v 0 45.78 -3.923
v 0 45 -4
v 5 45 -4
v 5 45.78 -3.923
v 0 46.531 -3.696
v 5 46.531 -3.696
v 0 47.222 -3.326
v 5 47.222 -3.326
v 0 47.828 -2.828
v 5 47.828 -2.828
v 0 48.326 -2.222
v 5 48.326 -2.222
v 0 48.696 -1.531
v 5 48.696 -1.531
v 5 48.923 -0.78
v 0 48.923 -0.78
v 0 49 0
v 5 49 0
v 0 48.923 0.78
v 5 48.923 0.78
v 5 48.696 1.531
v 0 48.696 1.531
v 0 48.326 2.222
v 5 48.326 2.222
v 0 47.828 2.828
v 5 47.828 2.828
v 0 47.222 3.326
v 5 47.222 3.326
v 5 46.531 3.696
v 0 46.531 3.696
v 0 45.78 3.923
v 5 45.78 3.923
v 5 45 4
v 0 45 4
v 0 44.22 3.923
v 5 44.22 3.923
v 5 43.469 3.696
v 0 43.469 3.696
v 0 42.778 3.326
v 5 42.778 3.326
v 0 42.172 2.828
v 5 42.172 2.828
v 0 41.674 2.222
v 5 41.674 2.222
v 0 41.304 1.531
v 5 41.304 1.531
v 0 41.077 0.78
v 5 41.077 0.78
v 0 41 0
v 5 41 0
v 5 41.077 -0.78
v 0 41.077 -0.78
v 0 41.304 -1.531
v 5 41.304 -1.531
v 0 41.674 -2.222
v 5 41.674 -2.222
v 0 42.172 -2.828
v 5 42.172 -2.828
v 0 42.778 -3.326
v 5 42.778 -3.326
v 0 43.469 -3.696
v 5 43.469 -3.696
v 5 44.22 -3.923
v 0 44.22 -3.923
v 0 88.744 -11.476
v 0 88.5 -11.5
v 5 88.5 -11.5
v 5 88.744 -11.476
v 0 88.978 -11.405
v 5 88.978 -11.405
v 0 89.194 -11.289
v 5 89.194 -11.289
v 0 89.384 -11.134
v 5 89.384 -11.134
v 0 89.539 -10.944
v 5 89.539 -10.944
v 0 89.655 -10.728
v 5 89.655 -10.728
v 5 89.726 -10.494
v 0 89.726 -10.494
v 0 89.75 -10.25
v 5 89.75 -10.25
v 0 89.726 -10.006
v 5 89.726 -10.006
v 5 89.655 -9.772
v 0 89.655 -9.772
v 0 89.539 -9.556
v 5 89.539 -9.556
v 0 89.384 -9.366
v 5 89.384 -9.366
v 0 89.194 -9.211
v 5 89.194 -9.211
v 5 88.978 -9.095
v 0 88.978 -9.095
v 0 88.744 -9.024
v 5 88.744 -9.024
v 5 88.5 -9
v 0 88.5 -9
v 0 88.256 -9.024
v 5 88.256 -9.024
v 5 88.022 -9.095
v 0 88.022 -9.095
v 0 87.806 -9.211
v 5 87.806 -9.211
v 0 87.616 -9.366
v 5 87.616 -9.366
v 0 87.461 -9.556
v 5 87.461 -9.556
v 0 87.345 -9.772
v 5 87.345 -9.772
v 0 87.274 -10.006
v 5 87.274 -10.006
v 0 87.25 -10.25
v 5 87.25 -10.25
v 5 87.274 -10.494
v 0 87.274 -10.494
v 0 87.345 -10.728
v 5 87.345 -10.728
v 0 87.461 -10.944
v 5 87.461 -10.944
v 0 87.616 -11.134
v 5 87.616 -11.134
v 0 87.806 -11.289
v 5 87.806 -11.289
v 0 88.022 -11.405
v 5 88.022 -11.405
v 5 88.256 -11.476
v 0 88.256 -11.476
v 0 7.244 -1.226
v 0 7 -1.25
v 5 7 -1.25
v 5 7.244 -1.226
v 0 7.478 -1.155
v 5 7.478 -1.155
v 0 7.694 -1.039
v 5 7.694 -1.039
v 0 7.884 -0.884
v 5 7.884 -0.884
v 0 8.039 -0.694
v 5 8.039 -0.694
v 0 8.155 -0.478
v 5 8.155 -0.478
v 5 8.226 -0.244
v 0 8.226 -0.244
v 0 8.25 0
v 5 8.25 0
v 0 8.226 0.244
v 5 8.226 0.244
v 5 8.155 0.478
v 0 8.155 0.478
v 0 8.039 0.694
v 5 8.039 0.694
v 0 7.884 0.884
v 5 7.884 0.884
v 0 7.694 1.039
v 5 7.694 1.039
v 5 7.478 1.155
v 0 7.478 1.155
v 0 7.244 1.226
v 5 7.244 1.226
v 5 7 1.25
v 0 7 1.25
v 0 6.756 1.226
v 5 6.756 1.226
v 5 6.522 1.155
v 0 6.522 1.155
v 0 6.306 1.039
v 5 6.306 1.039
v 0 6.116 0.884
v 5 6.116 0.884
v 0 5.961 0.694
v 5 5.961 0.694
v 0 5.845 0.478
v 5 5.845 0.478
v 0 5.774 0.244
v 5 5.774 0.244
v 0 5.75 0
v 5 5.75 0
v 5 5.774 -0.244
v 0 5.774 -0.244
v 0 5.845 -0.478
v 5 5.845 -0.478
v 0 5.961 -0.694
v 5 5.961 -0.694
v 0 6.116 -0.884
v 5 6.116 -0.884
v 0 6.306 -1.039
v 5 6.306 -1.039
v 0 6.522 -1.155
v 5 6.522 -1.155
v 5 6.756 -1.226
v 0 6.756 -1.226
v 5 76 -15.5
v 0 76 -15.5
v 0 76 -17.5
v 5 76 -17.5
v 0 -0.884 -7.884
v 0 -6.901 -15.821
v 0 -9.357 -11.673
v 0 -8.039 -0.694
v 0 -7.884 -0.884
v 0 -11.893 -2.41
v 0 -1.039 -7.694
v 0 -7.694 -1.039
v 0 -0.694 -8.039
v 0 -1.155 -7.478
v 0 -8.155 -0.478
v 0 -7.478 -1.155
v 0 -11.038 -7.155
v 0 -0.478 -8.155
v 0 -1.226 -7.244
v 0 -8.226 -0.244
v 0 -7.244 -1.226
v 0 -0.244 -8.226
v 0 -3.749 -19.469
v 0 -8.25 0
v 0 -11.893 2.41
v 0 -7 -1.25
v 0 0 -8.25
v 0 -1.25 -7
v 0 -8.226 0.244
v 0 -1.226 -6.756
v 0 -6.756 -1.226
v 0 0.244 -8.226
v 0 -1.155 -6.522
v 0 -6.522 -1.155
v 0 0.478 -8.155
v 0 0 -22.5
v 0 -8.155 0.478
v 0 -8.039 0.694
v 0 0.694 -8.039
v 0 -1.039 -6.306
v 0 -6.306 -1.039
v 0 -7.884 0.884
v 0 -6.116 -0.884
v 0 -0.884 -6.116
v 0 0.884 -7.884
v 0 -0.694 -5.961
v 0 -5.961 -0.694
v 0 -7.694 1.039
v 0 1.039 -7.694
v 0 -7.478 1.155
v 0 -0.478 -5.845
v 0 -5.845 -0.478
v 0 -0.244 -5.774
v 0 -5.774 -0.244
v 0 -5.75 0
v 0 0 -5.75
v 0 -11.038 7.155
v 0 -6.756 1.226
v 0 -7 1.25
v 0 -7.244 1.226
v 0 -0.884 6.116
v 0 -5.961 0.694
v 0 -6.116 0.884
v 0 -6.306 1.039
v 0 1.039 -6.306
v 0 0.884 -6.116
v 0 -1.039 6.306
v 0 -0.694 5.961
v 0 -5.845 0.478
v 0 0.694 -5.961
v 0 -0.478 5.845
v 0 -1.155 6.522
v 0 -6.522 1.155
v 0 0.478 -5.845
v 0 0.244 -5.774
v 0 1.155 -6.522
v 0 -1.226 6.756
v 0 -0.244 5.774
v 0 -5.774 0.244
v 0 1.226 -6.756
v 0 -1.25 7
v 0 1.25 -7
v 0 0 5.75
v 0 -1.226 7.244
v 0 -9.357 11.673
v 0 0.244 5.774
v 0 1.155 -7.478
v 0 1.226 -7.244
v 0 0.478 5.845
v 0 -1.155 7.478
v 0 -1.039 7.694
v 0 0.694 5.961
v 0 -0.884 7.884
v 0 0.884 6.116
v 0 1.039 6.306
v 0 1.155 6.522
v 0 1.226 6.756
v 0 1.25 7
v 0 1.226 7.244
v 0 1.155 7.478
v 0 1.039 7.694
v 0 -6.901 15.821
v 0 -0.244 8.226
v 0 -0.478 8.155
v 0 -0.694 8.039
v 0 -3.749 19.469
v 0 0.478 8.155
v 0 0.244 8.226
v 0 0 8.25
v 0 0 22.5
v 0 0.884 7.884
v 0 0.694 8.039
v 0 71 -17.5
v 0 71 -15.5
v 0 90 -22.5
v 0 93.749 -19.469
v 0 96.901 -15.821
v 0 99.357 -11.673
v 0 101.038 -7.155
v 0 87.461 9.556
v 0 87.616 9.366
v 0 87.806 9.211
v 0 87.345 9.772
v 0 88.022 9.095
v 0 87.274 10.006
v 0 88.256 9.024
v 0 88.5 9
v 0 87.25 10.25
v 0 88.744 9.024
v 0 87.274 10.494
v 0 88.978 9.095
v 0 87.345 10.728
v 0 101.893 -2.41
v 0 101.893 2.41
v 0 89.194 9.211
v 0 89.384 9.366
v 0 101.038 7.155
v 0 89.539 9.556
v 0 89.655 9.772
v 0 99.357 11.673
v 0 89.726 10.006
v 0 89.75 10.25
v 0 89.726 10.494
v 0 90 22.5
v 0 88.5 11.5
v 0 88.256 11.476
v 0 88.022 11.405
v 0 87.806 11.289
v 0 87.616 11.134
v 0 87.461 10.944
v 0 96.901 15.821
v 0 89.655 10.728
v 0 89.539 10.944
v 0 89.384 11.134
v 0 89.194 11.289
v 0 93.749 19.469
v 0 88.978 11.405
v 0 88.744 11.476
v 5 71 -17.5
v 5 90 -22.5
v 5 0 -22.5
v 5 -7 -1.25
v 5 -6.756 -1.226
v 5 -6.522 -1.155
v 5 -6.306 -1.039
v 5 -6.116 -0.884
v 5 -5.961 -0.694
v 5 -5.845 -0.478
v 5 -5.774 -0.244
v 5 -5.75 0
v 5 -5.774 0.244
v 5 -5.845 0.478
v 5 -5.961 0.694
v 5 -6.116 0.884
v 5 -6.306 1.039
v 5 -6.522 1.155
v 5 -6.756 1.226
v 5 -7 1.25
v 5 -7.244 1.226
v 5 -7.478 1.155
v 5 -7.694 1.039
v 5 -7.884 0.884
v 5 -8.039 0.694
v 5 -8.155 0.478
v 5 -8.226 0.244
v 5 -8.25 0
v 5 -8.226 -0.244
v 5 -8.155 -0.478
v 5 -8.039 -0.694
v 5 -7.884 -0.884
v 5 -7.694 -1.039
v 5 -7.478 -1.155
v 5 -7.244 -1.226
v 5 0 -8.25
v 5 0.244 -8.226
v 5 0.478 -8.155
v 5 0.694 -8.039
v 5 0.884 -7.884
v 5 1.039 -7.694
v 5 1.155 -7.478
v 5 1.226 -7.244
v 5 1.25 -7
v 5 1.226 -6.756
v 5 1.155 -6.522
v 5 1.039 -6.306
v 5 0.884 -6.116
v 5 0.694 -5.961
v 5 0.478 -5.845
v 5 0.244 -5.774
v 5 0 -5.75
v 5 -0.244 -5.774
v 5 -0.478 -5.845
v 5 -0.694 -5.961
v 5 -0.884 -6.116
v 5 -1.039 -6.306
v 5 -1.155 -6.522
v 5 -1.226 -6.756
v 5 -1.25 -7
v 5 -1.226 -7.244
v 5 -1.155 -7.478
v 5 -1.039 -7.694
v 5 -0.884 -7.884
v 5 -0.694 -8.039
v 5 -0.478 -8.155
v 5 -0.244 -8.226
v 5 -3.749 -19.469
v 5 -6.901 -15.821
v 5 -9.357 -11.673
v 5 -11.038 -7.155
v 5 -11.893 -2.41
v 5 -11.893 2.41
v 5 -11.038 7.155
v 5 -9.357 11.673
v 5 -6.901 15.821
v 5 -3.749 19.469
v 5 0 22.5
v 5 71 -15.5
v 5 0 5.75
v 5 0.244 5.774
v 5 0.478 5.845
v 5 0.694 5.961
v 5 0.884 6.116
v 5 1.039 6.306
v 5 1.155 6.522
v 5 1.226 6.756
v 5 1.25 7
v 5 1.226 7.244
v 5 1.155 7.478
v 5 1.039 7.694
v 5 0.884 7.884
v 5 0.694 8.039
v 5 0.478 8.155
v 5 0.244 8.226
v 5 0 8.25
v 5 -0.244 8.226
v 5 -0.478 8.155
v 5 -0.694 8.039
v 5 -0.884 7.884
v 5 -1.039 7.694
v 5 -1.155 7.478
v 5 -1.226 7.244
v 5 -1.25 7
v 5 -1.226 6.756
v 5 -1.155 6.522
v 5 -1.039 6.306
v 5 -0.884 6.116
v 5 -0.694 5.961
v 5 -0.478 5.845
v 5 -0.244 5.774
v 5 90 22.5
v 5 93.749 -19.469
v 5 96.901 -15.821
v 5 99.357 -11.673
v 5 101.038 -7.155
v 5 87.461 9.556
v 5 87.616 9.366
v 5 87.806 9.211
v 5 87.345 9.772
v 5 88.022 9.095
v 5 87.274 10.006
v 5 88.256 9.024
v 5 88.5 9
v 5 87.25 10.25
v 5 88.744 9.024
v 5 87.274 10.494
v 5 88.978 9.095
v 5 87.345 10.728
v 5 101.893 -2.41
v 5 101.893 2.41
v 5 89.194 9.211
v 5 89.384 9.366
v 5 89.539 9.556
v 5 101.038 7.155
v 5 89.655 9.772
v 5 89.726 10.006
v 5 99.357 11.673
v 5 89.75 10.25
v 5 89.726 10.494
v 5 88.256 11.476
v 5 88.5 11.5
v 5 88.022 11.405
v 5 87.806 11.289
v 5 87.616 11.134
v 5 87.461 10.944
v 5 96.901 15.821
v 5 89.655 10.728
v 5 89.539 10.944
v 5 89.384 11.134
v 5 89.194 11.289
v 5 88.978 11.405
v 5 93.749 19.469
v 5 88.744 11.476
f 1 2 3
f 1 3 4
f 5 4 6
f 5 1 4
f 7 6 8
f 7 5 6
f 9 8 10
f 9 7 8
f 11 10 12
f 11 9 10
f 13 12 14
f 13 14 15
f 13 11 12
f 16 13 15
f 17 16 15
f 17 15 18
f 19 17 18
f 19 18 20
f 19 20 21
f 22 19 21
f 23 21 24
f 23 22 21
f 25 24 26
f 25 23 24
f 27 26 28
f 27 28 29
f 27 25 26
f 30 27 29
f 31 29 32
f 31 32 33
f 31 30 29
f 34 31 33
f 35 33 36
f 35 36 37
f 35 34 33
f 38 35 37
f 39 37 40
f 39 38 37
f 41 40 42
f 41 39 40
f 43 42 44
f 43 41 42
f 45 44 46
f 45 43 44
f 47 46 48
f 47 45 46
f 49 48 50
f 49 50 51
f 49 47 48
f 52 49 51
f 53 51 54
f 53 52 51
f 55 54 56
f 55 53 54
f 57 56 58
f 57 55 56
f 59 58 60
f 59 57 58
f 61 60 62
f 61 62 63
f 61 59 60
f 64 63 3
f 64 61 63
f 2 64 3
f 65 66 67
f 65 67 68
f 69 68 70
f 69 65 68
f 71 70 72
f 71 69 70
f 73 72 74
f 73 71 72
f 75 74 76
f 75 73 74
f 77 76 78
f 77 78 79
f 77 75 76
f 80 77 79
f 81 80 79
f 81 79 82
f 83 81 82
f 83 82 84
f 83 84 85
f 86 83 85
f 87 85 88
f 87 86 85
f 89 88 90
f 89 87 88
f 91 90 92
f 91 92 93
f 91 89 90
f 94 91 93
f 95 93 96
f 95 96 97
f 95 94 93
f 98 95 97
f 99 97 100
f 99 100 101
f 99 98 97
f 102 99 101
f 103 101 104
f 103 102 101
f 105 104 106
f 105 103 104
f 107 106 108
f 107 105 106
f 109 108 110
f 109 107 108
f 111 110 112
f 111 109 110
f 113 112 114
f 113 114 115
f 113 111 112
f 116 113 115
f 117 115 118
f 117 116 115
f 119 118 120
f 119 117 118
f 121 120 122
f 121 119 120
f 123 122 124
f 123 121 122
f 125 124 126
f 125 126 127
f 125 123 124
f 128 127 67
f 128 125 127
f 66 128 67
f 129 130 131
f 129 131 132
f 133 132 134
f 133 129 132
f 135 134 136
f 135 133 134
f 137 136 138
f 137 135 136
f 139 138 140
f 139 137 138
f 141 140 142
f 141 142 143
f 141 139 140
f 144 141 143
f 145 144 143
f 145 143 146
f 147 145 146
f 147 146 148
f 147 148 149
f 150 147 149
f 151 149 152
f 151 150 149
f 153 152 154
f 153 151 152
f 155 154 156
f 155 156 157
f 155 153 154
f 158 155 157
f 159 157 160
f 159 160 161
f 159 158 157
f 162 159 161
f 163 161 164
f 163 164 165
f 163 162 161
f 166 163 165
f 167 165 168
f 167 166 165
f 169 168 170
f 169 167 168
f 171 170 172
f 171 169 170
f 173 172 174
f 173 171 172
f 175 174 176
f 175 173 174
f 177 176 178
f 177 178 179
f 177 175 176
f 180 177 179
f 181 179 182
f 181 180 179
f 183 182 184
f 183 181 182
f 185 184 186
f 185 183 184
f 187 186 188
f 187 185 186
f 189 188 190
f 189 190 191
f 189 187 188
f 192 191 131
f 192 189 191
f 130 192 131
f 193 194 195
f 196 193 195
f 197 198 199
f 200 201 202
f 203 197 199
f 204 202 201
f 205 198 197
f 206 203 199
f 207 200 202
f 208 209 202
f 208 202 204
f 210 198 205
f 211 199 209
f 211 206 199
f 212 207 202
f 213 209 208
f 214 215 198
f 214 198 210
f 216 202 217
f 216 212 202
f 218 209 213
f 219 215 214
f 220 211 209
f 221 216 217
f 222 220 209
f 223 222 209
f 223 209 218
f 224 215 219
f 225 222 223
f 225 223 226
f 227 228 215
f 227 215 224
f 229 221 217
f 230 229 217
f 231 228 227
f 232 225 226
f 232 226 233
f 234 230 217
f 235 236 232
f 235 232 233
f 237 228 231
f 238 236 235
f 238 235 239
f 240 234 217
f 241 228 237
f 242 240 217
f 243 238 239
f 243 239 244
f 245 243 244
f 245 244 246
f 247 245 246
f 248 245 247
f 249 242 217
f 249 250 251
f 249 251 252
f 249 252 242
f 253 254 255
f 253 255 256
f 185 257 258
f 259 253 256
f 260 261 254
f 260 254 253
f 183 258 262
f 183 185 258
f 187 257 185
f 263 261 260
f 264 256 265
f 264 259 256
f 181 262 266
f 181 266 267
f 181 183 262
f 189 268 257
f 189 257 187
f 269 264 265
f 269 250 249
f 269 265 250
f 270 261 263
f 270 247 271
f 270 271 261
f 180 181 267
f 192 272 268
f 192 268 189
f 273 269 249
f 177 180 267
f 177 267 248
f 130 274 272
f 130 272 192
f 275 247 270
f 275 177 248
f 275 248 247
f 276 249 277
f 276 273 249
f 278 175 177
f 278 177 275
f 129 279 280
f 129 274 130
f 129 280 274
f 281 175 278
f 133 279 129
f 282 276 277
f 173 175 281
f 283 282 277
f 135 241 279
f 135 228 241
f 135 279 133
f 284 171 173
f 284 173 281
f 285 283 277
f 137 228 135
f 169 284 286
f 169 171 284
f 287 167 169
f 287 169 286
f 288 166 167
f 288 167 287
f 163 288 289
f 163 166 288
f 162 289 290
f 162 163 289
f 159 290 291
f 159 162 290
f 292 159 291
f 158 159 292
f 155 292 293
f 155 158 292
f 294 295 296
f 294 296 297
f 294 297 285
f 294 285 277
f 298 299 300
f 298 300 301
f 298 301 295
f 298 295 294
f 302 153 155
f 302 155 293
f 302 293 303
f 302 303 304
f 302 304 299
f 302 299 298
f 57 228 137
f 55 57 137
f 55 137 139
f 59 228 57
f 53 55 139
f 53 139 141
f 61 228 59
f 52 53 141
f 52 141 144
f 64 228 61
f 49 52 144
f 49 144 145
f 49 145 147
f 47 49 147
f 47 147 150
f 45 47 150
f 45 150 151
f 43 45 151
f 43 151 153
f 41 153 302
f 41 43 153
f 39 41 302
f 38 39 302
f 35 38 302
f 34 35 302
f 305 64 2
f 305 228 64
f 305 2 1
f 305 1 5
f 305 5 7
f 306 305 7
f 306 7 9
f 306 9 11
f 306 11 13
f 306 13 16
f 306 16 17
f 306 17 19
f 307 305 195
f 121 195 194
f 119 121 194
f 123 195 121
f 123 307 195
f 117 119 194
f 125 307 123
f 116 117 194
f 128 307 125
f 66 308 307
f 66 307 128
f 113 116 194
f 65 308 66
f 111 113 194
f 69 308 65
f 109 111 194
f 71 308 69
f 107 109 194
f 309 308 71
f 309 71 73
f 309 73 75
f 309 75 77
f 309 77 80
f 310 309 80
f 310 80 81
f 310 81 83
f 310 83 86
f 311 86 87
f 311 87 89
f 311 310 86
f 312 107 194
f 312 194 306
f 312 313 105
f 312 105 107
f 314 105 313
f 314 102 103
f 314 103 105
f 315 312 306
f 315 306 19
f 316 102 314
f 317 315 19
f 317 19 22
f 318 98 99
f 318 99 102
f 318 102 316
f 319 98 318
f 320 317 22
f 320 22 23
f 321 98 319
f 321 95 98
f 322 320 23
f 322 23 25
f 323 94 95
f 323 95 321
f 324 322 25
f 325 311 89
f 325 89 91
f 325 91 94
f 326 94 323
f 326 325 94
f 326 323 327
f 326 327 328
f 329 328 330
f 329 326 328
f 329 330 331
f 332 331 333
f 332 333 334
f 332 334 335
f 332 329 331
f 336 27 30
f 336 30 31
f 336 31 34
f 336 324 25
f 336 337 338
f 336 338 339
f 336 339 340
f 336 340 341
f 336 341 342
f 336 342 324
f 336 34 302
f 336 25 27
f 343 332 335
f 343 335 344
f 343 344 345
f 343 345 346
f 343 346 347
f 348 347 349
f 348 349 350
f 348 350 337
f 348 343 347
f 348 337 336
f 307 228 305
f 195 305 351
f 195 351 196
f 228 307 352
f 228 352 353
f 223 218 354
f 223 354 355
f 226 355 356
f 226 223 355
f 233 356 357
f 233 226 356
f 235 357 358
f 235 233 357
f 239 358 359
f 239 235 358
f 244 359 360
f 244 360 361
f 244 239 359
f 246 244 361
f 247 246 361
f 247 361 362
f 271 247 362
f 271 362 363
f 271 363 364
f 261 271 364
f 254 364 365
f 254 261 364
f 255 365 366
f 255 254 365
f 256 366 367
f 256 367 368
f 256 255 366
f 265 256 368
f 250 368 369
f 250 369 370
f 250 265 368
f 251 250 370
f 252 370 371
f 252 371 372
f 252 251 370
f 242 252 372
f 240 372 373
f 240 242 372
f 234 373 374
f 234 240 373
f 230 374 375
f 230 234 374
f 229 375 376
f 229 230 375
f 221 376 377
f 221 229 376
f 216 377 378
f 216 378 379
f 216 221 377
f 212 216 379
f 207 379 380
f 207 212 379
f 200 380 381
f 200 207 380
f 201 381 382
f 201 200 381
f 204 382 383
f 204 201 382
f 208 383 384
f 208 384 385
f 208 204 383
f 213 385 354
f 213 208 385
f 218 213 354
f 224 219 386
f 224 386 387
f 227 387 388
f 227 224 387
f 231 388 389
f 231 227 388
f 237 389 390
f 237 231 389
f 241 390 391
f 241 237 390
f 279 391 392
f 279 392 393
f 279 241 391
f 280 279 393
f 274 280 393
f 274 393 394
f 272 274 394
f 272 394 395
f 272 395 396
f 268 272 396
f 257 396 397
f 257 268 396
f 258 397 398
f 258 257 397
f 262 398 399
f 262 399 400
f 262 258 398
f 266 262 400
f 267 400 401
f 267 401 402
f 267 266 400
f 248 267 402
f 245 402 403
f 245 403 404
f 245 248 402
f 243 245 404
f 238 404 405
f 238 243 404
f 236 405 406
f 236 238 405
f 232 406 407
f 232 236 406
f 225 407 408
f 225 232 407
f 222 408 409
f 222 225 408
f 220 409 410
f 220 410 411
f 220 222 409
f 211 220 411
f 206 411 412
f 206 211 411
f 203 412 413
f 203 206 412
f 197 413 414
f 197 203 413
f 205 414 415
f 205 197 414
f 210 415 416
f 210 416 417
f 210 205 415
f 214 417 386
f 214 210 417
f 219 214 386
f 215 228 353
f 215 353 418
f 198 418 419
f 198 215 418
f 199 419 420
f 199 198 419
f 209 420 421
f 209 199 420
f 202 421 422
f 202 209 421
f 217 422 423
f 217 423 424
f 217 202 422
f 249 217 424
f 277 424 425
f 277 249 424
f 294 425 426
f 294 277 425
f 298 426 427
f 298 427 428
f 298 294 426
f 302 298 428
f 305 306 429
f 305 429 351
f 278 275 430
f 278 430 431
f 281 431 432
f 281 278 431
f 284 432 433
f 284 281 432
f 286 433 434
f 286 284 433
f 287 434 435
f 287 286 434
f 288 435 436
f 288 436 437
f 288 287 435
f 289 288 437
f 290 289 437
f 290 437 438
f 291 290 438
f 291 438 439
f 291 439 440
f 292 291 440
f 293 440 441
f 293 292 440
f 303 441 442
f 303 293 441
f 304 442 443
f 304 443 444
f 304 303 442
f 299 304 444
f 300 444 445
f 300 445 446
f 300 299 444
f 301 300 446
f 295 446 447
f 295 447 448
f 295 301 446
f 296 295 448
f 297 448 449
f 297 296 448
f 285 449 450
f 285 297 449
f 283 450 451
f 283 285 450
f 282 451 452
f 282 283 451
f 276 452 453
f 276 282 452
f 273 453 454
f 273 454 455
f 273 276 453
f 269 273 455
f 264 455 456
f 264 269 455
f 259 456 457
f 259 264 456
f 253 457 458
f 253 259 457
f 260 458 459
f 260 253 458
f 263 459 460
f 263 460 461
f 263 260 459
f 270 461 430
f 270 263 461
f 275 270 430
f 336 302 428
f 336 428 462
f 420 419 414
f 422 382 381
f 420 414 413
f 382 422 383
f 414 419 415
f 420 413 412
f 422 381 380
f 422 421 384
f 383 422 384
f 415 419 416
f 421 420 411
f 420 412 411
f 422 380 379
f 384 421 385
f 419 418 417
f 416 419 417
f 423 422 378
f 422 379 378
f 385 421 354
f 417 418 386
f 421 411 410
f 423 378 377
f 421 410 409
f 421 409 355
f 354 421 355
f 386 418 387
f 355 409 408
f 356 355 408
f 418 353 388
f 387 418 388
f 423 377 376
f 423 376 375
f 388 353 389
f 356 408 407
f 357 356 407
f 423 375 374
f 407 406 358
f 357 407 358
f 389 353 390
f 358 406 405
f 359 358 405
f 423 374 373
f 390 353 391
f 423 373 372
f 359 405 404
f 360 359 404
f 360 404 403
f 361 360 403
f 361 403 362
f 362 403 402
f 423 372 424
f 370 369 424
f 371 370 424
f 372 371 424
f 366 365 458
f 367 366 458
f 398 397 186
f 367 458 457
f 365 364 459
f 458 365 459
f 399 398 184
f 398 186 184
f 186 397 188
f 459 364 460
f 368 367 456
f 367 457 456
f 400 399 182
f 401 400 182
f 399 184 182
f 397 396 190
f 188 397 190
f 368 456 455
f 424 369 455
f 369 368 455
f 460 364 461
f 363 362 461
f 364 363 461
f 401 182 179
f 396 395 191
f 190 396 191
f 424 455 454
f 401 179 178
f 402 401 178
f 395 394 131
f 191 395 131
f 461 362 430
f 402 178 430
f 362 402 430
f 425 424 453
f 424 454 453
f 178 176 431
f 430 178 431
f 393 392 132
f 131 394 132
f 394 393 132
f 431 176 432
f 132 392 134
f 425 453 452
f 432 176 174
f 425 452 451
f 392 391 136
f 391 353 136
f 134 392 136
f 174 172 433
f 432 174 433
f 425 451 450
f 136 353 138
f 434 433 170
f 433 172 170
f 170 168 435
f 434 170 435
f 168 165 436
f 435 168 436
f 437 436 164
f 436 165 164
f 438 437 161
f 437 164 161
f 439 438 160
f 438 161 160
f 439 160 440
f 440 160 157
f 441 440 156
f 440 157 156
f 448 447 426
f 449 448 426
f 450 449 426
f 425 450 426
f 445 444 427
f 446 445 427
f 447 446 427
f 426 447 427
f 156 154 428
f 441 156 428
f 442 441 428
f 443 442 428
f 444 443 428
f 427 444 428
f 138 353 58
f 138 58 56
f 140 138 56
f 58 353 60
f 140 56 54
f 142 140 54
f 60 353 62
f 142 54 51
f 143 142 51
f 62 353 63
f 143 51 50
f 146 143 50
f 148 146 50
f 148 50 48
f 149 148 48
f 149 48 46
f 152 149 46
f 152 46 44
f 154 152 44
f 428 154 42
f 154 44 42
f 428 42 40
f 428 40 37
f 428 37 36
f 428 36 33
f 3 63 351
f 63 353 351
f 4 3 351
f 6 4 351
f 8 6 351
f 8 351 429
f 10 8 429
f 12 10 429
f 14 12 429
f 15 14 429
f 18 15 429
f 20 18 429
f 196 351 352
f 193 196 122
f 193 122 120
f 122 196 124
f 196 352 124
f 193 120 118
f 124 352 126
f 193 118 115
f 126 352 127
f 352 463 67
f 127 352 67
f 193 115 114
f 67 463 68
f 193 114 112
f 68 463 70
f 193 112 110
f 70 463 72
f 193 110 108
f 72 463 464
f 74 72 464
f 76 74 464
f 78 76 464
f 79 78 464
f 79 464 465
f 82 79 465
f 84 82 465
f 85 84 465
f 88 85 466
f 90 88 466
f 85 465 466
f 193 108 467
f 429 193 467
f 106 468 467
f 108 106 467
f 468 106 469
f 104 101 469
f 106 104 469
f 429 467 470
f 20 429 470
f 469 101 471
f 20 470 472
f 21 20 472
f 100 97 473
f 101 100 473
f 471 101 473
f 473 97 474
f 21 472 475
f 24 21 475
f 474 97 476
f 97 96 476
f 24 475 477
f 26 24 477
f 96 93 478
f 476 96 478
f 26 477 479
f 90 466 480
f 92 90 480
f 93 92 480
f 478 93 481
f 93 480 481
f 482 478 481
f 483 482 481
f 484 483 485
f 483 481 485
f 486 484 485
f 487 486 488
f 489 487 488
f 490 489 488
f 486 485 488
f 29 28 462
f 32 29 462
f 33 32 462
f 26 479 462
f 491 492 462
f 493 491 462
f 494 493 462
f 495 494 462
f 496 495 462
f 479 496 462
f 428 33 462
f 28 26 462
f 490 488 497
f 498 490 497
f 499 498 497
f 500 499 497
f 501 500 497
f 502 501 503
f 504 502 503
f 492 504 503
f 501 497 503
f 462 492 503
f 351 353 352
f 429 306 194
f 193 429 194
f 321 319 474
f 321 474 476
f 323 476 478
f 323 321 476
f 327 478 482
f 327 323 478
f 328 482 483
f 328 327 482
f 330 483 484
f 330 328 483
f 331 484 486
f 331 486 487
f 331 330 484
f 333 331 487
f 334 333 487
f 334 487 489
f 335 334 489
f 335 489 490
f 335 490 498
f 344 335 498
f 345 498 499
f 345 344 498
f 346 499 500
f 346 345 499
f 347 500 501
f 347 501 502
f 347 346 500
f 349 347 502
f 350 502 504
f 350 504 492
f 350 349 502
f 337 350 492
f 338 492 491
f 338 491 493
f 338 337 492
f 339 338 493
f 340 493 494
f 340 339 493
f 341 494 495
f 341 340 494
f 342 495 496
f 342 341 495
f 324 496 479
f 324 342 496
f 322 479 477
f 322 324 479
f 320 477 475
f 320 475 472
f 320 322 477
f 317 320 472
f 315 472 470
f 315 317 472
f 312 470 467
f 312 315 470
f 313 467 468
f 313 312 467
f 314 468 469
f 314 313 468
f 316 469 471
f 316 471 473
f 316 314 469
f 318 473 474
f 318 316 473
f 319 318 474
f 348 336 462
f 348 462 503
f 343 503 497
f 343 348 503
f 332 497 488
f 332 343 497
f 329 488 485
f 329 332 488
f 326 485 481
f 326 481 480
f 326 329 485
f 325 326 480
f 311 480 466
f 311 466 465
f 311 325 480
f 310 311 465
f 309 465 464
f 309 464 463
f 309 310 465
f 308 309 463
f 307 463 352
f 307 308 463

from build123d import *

# Parameters (mm, degrees)
SKETCH1_R           = 1.25
SKETCH1_R_2         = 4
SKETCH1_W           = 2
SKETCH1_H           = 5
BOSS_EXTRUDE1_DEPTH = 5


with BuildPart() as part:
    # Sketch1 → Boss-Extrude1 (new body)
    with BuildSketch(Plane(origin=(0, 0, 0), x_dir=(0, 0, -1), z_dir=(1, 0, 0))):
        with BuildLine():
            Line((-22.5, 0), (-22.5, 90))
            ThreePointArc((-22.5, 90), (0, 102), (22.5, 90))
            Line((22.5, 90), (22.5, 0))
            ThreePointArc((22.5, 0), (0, -12), (-22.5, 0))
        make_face()
        with Locations((0, 7)):
            Circle(SKETCH1_R, mode=Mode.SUBTRACT)
        with Locations((7, 0)):
            Circle(SKETCH1_R, mode=Mode.SUBTRACT)
        with Locations((0, -7)):
            Circle(SKETCH1_R, mode=Mode.SUBTRACT)
        with Locations((-7, 0)):
            Circle(SKETCH1_R, mode=Mode.SUBTRACT)
        with Locations((-10.25, 88.5)):
            Circle(SKETCH1_R, mode=Mode.SUBTRACT)
        with Locations((10.25, 88.5)):
            Circle(SKETCH1_R, mode=Mode.SUBTRACT)
        with Locations((0, 45)):
            Circle(SKETCH1_R_2, mode=Mode.SUBTRACT)
        with Locations((16.5, 73.5)):
            Rectangle(SKETCH1_W, SKETCH1_H, mode=Mode.SUBTRACT)
    extrude(amount=BOSS_EXTRUDE1_DEPTH)


solid = part.part
